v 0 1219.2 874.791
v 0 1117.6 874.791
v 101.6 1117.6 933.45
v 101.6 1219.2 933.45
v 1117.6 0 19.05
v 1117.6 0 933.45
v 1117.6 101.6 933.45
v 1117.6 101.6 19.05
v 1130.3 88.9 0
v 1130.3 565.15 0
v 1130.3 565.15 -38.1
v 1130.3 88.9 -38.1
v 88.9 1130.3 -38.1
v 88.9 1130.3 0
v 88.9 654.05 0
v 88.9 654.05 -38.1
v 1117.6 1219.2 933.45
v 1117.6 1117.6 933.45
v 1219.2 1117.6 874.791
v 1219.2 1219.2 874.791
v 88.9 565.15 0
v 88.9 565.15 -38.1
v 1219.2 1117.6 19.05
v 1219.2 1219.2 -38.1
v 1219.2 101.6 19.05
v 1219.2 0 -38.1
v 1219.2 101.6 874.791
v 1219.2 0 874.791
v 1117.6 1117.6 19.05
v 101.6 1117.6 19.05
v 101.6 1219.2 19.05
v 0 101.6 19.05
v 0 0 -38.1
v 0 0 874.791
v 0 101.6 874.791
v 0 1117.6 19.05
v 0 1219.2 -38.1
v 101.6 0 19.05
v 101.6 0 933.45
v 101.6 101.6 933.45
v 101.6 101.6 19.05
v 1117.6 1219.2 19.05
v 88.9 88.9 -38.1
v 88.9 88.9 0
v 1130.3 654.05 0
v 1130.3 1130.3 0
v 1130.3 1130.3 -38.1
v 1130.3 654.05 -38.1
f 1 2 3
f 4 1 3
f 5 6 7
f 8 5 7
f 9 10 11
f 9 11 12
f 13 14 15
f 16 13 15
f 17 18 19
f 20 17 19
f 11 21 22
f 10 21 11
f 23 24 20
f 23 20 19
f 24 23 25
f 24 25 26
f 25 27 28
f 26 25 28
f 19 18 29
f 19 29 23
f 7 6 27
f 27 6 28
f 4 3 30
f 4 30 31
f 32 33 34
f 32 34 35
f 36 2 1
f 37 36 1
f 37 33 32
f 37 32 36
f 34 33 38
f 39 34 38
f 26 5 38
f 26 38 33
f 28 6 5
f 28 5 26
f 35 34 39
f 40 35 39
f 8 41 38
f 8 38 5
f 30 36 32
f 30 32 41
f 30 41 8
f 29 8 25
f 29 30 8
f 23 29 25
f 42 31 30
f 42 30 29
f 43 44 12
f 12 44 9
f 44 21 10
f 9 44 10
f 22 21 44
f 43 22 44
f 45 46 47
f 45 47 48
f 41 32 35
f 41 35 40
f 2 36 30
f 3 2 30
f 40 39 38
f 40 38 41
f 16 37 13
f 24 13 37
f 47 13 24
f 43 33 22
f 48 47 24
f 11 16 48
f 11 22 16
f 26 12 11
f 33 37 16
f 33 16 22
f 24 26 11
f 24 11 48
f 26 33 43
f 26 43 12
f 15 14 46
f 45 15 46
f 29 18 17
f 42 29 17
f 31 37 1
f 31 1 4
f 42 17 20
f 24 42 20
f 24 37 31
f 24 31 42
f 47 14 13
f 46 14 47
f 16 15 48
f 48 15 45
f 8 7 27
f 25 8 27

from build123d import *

# Parameters (mm, degrees)
F0_W          = 1219.2
F0_H          = 1219.2
F1_DEPTH      = 19.05
F2_W          = 1219.2
F2_H          = 1219.2
F2_W_2        = 1041.4
F2_H_2        = 476.25
F3_DEPTH      = 38.1
F4_W          = 101.6
F4_H          = 101.6
F5_DEPTH      = 914.4
F7_DEPTH      = 2867
F7_DEPTH_BACK = 1219.201


# Not quite as in the source:
# - an extrude ends at something that could not be found from the text; its depth is read off the source's solid


with BuildPart() as f1:
    # F0 (on Top) → F1 (new body)
    with BuildSketch(Plane.XY):
        with Locations((609.6, 609.6)):
            Rectangle(F0_W, F0_H)
    extrude(amount=F1_DEPTH)

    # F2 (on face) → F3 (join)
    with BuildSketch(Plane(origin=(0, 0, 0), x_dir=(1, 0, 0), z_dir=(0, 0, -1))):
        with Locations((609.6, -609.6)):
            Rectangle(F2_W, F2_H)
        with Locations((609.6, -892.175)):
            Rectangle(F2_W_2, F2_H_2, mode=Mode.SUBTRACT)
        with Locations((609.6, -327.025)):
            Rectangle(F2_W_2, F2_H_2, mode=Mode.SUBTRACT)
    extrude(amount=F3_DEPTH)

    # F4 (on face) → F5 (join)
    with BuildSketch(Plane.XY.offset(19.05)):
        with Locations((50.8, 1168.4)):
            Rectangle(F4_W, F4_H)
        with Locations((50.8, 50.8)):
            Rectangle(F4_W, F4_H)
        with Locations((1168.4, 50.8)):
            Rectangle(F4_W, F4_H)
        with Locations((1168.4, 1168.4)):
            Rectangle(F4_W, F4_H)
    extrude(amount=F5_DEPTH)

    # F6 (on face) → F7 (cut, two sides)
    with BuildSketch(Plane.XZ) as f7_sk:
        Polygon((0, 874.7912126503), (101.6, 933.45), (0, 933.45), align=None)
        Polygon((1219.2, 933.45), (1117.6, 933.45), (1219.2, 874.7912126503), align=None)
    extrude(amount=F7_DEPTH, mode=Mode.SUBTRACT)
    extrude(f7_sk.sketch, amount=-F7_DEPTH_BACK, mode=Mode.SUBTRACT)


solid = f1.part
